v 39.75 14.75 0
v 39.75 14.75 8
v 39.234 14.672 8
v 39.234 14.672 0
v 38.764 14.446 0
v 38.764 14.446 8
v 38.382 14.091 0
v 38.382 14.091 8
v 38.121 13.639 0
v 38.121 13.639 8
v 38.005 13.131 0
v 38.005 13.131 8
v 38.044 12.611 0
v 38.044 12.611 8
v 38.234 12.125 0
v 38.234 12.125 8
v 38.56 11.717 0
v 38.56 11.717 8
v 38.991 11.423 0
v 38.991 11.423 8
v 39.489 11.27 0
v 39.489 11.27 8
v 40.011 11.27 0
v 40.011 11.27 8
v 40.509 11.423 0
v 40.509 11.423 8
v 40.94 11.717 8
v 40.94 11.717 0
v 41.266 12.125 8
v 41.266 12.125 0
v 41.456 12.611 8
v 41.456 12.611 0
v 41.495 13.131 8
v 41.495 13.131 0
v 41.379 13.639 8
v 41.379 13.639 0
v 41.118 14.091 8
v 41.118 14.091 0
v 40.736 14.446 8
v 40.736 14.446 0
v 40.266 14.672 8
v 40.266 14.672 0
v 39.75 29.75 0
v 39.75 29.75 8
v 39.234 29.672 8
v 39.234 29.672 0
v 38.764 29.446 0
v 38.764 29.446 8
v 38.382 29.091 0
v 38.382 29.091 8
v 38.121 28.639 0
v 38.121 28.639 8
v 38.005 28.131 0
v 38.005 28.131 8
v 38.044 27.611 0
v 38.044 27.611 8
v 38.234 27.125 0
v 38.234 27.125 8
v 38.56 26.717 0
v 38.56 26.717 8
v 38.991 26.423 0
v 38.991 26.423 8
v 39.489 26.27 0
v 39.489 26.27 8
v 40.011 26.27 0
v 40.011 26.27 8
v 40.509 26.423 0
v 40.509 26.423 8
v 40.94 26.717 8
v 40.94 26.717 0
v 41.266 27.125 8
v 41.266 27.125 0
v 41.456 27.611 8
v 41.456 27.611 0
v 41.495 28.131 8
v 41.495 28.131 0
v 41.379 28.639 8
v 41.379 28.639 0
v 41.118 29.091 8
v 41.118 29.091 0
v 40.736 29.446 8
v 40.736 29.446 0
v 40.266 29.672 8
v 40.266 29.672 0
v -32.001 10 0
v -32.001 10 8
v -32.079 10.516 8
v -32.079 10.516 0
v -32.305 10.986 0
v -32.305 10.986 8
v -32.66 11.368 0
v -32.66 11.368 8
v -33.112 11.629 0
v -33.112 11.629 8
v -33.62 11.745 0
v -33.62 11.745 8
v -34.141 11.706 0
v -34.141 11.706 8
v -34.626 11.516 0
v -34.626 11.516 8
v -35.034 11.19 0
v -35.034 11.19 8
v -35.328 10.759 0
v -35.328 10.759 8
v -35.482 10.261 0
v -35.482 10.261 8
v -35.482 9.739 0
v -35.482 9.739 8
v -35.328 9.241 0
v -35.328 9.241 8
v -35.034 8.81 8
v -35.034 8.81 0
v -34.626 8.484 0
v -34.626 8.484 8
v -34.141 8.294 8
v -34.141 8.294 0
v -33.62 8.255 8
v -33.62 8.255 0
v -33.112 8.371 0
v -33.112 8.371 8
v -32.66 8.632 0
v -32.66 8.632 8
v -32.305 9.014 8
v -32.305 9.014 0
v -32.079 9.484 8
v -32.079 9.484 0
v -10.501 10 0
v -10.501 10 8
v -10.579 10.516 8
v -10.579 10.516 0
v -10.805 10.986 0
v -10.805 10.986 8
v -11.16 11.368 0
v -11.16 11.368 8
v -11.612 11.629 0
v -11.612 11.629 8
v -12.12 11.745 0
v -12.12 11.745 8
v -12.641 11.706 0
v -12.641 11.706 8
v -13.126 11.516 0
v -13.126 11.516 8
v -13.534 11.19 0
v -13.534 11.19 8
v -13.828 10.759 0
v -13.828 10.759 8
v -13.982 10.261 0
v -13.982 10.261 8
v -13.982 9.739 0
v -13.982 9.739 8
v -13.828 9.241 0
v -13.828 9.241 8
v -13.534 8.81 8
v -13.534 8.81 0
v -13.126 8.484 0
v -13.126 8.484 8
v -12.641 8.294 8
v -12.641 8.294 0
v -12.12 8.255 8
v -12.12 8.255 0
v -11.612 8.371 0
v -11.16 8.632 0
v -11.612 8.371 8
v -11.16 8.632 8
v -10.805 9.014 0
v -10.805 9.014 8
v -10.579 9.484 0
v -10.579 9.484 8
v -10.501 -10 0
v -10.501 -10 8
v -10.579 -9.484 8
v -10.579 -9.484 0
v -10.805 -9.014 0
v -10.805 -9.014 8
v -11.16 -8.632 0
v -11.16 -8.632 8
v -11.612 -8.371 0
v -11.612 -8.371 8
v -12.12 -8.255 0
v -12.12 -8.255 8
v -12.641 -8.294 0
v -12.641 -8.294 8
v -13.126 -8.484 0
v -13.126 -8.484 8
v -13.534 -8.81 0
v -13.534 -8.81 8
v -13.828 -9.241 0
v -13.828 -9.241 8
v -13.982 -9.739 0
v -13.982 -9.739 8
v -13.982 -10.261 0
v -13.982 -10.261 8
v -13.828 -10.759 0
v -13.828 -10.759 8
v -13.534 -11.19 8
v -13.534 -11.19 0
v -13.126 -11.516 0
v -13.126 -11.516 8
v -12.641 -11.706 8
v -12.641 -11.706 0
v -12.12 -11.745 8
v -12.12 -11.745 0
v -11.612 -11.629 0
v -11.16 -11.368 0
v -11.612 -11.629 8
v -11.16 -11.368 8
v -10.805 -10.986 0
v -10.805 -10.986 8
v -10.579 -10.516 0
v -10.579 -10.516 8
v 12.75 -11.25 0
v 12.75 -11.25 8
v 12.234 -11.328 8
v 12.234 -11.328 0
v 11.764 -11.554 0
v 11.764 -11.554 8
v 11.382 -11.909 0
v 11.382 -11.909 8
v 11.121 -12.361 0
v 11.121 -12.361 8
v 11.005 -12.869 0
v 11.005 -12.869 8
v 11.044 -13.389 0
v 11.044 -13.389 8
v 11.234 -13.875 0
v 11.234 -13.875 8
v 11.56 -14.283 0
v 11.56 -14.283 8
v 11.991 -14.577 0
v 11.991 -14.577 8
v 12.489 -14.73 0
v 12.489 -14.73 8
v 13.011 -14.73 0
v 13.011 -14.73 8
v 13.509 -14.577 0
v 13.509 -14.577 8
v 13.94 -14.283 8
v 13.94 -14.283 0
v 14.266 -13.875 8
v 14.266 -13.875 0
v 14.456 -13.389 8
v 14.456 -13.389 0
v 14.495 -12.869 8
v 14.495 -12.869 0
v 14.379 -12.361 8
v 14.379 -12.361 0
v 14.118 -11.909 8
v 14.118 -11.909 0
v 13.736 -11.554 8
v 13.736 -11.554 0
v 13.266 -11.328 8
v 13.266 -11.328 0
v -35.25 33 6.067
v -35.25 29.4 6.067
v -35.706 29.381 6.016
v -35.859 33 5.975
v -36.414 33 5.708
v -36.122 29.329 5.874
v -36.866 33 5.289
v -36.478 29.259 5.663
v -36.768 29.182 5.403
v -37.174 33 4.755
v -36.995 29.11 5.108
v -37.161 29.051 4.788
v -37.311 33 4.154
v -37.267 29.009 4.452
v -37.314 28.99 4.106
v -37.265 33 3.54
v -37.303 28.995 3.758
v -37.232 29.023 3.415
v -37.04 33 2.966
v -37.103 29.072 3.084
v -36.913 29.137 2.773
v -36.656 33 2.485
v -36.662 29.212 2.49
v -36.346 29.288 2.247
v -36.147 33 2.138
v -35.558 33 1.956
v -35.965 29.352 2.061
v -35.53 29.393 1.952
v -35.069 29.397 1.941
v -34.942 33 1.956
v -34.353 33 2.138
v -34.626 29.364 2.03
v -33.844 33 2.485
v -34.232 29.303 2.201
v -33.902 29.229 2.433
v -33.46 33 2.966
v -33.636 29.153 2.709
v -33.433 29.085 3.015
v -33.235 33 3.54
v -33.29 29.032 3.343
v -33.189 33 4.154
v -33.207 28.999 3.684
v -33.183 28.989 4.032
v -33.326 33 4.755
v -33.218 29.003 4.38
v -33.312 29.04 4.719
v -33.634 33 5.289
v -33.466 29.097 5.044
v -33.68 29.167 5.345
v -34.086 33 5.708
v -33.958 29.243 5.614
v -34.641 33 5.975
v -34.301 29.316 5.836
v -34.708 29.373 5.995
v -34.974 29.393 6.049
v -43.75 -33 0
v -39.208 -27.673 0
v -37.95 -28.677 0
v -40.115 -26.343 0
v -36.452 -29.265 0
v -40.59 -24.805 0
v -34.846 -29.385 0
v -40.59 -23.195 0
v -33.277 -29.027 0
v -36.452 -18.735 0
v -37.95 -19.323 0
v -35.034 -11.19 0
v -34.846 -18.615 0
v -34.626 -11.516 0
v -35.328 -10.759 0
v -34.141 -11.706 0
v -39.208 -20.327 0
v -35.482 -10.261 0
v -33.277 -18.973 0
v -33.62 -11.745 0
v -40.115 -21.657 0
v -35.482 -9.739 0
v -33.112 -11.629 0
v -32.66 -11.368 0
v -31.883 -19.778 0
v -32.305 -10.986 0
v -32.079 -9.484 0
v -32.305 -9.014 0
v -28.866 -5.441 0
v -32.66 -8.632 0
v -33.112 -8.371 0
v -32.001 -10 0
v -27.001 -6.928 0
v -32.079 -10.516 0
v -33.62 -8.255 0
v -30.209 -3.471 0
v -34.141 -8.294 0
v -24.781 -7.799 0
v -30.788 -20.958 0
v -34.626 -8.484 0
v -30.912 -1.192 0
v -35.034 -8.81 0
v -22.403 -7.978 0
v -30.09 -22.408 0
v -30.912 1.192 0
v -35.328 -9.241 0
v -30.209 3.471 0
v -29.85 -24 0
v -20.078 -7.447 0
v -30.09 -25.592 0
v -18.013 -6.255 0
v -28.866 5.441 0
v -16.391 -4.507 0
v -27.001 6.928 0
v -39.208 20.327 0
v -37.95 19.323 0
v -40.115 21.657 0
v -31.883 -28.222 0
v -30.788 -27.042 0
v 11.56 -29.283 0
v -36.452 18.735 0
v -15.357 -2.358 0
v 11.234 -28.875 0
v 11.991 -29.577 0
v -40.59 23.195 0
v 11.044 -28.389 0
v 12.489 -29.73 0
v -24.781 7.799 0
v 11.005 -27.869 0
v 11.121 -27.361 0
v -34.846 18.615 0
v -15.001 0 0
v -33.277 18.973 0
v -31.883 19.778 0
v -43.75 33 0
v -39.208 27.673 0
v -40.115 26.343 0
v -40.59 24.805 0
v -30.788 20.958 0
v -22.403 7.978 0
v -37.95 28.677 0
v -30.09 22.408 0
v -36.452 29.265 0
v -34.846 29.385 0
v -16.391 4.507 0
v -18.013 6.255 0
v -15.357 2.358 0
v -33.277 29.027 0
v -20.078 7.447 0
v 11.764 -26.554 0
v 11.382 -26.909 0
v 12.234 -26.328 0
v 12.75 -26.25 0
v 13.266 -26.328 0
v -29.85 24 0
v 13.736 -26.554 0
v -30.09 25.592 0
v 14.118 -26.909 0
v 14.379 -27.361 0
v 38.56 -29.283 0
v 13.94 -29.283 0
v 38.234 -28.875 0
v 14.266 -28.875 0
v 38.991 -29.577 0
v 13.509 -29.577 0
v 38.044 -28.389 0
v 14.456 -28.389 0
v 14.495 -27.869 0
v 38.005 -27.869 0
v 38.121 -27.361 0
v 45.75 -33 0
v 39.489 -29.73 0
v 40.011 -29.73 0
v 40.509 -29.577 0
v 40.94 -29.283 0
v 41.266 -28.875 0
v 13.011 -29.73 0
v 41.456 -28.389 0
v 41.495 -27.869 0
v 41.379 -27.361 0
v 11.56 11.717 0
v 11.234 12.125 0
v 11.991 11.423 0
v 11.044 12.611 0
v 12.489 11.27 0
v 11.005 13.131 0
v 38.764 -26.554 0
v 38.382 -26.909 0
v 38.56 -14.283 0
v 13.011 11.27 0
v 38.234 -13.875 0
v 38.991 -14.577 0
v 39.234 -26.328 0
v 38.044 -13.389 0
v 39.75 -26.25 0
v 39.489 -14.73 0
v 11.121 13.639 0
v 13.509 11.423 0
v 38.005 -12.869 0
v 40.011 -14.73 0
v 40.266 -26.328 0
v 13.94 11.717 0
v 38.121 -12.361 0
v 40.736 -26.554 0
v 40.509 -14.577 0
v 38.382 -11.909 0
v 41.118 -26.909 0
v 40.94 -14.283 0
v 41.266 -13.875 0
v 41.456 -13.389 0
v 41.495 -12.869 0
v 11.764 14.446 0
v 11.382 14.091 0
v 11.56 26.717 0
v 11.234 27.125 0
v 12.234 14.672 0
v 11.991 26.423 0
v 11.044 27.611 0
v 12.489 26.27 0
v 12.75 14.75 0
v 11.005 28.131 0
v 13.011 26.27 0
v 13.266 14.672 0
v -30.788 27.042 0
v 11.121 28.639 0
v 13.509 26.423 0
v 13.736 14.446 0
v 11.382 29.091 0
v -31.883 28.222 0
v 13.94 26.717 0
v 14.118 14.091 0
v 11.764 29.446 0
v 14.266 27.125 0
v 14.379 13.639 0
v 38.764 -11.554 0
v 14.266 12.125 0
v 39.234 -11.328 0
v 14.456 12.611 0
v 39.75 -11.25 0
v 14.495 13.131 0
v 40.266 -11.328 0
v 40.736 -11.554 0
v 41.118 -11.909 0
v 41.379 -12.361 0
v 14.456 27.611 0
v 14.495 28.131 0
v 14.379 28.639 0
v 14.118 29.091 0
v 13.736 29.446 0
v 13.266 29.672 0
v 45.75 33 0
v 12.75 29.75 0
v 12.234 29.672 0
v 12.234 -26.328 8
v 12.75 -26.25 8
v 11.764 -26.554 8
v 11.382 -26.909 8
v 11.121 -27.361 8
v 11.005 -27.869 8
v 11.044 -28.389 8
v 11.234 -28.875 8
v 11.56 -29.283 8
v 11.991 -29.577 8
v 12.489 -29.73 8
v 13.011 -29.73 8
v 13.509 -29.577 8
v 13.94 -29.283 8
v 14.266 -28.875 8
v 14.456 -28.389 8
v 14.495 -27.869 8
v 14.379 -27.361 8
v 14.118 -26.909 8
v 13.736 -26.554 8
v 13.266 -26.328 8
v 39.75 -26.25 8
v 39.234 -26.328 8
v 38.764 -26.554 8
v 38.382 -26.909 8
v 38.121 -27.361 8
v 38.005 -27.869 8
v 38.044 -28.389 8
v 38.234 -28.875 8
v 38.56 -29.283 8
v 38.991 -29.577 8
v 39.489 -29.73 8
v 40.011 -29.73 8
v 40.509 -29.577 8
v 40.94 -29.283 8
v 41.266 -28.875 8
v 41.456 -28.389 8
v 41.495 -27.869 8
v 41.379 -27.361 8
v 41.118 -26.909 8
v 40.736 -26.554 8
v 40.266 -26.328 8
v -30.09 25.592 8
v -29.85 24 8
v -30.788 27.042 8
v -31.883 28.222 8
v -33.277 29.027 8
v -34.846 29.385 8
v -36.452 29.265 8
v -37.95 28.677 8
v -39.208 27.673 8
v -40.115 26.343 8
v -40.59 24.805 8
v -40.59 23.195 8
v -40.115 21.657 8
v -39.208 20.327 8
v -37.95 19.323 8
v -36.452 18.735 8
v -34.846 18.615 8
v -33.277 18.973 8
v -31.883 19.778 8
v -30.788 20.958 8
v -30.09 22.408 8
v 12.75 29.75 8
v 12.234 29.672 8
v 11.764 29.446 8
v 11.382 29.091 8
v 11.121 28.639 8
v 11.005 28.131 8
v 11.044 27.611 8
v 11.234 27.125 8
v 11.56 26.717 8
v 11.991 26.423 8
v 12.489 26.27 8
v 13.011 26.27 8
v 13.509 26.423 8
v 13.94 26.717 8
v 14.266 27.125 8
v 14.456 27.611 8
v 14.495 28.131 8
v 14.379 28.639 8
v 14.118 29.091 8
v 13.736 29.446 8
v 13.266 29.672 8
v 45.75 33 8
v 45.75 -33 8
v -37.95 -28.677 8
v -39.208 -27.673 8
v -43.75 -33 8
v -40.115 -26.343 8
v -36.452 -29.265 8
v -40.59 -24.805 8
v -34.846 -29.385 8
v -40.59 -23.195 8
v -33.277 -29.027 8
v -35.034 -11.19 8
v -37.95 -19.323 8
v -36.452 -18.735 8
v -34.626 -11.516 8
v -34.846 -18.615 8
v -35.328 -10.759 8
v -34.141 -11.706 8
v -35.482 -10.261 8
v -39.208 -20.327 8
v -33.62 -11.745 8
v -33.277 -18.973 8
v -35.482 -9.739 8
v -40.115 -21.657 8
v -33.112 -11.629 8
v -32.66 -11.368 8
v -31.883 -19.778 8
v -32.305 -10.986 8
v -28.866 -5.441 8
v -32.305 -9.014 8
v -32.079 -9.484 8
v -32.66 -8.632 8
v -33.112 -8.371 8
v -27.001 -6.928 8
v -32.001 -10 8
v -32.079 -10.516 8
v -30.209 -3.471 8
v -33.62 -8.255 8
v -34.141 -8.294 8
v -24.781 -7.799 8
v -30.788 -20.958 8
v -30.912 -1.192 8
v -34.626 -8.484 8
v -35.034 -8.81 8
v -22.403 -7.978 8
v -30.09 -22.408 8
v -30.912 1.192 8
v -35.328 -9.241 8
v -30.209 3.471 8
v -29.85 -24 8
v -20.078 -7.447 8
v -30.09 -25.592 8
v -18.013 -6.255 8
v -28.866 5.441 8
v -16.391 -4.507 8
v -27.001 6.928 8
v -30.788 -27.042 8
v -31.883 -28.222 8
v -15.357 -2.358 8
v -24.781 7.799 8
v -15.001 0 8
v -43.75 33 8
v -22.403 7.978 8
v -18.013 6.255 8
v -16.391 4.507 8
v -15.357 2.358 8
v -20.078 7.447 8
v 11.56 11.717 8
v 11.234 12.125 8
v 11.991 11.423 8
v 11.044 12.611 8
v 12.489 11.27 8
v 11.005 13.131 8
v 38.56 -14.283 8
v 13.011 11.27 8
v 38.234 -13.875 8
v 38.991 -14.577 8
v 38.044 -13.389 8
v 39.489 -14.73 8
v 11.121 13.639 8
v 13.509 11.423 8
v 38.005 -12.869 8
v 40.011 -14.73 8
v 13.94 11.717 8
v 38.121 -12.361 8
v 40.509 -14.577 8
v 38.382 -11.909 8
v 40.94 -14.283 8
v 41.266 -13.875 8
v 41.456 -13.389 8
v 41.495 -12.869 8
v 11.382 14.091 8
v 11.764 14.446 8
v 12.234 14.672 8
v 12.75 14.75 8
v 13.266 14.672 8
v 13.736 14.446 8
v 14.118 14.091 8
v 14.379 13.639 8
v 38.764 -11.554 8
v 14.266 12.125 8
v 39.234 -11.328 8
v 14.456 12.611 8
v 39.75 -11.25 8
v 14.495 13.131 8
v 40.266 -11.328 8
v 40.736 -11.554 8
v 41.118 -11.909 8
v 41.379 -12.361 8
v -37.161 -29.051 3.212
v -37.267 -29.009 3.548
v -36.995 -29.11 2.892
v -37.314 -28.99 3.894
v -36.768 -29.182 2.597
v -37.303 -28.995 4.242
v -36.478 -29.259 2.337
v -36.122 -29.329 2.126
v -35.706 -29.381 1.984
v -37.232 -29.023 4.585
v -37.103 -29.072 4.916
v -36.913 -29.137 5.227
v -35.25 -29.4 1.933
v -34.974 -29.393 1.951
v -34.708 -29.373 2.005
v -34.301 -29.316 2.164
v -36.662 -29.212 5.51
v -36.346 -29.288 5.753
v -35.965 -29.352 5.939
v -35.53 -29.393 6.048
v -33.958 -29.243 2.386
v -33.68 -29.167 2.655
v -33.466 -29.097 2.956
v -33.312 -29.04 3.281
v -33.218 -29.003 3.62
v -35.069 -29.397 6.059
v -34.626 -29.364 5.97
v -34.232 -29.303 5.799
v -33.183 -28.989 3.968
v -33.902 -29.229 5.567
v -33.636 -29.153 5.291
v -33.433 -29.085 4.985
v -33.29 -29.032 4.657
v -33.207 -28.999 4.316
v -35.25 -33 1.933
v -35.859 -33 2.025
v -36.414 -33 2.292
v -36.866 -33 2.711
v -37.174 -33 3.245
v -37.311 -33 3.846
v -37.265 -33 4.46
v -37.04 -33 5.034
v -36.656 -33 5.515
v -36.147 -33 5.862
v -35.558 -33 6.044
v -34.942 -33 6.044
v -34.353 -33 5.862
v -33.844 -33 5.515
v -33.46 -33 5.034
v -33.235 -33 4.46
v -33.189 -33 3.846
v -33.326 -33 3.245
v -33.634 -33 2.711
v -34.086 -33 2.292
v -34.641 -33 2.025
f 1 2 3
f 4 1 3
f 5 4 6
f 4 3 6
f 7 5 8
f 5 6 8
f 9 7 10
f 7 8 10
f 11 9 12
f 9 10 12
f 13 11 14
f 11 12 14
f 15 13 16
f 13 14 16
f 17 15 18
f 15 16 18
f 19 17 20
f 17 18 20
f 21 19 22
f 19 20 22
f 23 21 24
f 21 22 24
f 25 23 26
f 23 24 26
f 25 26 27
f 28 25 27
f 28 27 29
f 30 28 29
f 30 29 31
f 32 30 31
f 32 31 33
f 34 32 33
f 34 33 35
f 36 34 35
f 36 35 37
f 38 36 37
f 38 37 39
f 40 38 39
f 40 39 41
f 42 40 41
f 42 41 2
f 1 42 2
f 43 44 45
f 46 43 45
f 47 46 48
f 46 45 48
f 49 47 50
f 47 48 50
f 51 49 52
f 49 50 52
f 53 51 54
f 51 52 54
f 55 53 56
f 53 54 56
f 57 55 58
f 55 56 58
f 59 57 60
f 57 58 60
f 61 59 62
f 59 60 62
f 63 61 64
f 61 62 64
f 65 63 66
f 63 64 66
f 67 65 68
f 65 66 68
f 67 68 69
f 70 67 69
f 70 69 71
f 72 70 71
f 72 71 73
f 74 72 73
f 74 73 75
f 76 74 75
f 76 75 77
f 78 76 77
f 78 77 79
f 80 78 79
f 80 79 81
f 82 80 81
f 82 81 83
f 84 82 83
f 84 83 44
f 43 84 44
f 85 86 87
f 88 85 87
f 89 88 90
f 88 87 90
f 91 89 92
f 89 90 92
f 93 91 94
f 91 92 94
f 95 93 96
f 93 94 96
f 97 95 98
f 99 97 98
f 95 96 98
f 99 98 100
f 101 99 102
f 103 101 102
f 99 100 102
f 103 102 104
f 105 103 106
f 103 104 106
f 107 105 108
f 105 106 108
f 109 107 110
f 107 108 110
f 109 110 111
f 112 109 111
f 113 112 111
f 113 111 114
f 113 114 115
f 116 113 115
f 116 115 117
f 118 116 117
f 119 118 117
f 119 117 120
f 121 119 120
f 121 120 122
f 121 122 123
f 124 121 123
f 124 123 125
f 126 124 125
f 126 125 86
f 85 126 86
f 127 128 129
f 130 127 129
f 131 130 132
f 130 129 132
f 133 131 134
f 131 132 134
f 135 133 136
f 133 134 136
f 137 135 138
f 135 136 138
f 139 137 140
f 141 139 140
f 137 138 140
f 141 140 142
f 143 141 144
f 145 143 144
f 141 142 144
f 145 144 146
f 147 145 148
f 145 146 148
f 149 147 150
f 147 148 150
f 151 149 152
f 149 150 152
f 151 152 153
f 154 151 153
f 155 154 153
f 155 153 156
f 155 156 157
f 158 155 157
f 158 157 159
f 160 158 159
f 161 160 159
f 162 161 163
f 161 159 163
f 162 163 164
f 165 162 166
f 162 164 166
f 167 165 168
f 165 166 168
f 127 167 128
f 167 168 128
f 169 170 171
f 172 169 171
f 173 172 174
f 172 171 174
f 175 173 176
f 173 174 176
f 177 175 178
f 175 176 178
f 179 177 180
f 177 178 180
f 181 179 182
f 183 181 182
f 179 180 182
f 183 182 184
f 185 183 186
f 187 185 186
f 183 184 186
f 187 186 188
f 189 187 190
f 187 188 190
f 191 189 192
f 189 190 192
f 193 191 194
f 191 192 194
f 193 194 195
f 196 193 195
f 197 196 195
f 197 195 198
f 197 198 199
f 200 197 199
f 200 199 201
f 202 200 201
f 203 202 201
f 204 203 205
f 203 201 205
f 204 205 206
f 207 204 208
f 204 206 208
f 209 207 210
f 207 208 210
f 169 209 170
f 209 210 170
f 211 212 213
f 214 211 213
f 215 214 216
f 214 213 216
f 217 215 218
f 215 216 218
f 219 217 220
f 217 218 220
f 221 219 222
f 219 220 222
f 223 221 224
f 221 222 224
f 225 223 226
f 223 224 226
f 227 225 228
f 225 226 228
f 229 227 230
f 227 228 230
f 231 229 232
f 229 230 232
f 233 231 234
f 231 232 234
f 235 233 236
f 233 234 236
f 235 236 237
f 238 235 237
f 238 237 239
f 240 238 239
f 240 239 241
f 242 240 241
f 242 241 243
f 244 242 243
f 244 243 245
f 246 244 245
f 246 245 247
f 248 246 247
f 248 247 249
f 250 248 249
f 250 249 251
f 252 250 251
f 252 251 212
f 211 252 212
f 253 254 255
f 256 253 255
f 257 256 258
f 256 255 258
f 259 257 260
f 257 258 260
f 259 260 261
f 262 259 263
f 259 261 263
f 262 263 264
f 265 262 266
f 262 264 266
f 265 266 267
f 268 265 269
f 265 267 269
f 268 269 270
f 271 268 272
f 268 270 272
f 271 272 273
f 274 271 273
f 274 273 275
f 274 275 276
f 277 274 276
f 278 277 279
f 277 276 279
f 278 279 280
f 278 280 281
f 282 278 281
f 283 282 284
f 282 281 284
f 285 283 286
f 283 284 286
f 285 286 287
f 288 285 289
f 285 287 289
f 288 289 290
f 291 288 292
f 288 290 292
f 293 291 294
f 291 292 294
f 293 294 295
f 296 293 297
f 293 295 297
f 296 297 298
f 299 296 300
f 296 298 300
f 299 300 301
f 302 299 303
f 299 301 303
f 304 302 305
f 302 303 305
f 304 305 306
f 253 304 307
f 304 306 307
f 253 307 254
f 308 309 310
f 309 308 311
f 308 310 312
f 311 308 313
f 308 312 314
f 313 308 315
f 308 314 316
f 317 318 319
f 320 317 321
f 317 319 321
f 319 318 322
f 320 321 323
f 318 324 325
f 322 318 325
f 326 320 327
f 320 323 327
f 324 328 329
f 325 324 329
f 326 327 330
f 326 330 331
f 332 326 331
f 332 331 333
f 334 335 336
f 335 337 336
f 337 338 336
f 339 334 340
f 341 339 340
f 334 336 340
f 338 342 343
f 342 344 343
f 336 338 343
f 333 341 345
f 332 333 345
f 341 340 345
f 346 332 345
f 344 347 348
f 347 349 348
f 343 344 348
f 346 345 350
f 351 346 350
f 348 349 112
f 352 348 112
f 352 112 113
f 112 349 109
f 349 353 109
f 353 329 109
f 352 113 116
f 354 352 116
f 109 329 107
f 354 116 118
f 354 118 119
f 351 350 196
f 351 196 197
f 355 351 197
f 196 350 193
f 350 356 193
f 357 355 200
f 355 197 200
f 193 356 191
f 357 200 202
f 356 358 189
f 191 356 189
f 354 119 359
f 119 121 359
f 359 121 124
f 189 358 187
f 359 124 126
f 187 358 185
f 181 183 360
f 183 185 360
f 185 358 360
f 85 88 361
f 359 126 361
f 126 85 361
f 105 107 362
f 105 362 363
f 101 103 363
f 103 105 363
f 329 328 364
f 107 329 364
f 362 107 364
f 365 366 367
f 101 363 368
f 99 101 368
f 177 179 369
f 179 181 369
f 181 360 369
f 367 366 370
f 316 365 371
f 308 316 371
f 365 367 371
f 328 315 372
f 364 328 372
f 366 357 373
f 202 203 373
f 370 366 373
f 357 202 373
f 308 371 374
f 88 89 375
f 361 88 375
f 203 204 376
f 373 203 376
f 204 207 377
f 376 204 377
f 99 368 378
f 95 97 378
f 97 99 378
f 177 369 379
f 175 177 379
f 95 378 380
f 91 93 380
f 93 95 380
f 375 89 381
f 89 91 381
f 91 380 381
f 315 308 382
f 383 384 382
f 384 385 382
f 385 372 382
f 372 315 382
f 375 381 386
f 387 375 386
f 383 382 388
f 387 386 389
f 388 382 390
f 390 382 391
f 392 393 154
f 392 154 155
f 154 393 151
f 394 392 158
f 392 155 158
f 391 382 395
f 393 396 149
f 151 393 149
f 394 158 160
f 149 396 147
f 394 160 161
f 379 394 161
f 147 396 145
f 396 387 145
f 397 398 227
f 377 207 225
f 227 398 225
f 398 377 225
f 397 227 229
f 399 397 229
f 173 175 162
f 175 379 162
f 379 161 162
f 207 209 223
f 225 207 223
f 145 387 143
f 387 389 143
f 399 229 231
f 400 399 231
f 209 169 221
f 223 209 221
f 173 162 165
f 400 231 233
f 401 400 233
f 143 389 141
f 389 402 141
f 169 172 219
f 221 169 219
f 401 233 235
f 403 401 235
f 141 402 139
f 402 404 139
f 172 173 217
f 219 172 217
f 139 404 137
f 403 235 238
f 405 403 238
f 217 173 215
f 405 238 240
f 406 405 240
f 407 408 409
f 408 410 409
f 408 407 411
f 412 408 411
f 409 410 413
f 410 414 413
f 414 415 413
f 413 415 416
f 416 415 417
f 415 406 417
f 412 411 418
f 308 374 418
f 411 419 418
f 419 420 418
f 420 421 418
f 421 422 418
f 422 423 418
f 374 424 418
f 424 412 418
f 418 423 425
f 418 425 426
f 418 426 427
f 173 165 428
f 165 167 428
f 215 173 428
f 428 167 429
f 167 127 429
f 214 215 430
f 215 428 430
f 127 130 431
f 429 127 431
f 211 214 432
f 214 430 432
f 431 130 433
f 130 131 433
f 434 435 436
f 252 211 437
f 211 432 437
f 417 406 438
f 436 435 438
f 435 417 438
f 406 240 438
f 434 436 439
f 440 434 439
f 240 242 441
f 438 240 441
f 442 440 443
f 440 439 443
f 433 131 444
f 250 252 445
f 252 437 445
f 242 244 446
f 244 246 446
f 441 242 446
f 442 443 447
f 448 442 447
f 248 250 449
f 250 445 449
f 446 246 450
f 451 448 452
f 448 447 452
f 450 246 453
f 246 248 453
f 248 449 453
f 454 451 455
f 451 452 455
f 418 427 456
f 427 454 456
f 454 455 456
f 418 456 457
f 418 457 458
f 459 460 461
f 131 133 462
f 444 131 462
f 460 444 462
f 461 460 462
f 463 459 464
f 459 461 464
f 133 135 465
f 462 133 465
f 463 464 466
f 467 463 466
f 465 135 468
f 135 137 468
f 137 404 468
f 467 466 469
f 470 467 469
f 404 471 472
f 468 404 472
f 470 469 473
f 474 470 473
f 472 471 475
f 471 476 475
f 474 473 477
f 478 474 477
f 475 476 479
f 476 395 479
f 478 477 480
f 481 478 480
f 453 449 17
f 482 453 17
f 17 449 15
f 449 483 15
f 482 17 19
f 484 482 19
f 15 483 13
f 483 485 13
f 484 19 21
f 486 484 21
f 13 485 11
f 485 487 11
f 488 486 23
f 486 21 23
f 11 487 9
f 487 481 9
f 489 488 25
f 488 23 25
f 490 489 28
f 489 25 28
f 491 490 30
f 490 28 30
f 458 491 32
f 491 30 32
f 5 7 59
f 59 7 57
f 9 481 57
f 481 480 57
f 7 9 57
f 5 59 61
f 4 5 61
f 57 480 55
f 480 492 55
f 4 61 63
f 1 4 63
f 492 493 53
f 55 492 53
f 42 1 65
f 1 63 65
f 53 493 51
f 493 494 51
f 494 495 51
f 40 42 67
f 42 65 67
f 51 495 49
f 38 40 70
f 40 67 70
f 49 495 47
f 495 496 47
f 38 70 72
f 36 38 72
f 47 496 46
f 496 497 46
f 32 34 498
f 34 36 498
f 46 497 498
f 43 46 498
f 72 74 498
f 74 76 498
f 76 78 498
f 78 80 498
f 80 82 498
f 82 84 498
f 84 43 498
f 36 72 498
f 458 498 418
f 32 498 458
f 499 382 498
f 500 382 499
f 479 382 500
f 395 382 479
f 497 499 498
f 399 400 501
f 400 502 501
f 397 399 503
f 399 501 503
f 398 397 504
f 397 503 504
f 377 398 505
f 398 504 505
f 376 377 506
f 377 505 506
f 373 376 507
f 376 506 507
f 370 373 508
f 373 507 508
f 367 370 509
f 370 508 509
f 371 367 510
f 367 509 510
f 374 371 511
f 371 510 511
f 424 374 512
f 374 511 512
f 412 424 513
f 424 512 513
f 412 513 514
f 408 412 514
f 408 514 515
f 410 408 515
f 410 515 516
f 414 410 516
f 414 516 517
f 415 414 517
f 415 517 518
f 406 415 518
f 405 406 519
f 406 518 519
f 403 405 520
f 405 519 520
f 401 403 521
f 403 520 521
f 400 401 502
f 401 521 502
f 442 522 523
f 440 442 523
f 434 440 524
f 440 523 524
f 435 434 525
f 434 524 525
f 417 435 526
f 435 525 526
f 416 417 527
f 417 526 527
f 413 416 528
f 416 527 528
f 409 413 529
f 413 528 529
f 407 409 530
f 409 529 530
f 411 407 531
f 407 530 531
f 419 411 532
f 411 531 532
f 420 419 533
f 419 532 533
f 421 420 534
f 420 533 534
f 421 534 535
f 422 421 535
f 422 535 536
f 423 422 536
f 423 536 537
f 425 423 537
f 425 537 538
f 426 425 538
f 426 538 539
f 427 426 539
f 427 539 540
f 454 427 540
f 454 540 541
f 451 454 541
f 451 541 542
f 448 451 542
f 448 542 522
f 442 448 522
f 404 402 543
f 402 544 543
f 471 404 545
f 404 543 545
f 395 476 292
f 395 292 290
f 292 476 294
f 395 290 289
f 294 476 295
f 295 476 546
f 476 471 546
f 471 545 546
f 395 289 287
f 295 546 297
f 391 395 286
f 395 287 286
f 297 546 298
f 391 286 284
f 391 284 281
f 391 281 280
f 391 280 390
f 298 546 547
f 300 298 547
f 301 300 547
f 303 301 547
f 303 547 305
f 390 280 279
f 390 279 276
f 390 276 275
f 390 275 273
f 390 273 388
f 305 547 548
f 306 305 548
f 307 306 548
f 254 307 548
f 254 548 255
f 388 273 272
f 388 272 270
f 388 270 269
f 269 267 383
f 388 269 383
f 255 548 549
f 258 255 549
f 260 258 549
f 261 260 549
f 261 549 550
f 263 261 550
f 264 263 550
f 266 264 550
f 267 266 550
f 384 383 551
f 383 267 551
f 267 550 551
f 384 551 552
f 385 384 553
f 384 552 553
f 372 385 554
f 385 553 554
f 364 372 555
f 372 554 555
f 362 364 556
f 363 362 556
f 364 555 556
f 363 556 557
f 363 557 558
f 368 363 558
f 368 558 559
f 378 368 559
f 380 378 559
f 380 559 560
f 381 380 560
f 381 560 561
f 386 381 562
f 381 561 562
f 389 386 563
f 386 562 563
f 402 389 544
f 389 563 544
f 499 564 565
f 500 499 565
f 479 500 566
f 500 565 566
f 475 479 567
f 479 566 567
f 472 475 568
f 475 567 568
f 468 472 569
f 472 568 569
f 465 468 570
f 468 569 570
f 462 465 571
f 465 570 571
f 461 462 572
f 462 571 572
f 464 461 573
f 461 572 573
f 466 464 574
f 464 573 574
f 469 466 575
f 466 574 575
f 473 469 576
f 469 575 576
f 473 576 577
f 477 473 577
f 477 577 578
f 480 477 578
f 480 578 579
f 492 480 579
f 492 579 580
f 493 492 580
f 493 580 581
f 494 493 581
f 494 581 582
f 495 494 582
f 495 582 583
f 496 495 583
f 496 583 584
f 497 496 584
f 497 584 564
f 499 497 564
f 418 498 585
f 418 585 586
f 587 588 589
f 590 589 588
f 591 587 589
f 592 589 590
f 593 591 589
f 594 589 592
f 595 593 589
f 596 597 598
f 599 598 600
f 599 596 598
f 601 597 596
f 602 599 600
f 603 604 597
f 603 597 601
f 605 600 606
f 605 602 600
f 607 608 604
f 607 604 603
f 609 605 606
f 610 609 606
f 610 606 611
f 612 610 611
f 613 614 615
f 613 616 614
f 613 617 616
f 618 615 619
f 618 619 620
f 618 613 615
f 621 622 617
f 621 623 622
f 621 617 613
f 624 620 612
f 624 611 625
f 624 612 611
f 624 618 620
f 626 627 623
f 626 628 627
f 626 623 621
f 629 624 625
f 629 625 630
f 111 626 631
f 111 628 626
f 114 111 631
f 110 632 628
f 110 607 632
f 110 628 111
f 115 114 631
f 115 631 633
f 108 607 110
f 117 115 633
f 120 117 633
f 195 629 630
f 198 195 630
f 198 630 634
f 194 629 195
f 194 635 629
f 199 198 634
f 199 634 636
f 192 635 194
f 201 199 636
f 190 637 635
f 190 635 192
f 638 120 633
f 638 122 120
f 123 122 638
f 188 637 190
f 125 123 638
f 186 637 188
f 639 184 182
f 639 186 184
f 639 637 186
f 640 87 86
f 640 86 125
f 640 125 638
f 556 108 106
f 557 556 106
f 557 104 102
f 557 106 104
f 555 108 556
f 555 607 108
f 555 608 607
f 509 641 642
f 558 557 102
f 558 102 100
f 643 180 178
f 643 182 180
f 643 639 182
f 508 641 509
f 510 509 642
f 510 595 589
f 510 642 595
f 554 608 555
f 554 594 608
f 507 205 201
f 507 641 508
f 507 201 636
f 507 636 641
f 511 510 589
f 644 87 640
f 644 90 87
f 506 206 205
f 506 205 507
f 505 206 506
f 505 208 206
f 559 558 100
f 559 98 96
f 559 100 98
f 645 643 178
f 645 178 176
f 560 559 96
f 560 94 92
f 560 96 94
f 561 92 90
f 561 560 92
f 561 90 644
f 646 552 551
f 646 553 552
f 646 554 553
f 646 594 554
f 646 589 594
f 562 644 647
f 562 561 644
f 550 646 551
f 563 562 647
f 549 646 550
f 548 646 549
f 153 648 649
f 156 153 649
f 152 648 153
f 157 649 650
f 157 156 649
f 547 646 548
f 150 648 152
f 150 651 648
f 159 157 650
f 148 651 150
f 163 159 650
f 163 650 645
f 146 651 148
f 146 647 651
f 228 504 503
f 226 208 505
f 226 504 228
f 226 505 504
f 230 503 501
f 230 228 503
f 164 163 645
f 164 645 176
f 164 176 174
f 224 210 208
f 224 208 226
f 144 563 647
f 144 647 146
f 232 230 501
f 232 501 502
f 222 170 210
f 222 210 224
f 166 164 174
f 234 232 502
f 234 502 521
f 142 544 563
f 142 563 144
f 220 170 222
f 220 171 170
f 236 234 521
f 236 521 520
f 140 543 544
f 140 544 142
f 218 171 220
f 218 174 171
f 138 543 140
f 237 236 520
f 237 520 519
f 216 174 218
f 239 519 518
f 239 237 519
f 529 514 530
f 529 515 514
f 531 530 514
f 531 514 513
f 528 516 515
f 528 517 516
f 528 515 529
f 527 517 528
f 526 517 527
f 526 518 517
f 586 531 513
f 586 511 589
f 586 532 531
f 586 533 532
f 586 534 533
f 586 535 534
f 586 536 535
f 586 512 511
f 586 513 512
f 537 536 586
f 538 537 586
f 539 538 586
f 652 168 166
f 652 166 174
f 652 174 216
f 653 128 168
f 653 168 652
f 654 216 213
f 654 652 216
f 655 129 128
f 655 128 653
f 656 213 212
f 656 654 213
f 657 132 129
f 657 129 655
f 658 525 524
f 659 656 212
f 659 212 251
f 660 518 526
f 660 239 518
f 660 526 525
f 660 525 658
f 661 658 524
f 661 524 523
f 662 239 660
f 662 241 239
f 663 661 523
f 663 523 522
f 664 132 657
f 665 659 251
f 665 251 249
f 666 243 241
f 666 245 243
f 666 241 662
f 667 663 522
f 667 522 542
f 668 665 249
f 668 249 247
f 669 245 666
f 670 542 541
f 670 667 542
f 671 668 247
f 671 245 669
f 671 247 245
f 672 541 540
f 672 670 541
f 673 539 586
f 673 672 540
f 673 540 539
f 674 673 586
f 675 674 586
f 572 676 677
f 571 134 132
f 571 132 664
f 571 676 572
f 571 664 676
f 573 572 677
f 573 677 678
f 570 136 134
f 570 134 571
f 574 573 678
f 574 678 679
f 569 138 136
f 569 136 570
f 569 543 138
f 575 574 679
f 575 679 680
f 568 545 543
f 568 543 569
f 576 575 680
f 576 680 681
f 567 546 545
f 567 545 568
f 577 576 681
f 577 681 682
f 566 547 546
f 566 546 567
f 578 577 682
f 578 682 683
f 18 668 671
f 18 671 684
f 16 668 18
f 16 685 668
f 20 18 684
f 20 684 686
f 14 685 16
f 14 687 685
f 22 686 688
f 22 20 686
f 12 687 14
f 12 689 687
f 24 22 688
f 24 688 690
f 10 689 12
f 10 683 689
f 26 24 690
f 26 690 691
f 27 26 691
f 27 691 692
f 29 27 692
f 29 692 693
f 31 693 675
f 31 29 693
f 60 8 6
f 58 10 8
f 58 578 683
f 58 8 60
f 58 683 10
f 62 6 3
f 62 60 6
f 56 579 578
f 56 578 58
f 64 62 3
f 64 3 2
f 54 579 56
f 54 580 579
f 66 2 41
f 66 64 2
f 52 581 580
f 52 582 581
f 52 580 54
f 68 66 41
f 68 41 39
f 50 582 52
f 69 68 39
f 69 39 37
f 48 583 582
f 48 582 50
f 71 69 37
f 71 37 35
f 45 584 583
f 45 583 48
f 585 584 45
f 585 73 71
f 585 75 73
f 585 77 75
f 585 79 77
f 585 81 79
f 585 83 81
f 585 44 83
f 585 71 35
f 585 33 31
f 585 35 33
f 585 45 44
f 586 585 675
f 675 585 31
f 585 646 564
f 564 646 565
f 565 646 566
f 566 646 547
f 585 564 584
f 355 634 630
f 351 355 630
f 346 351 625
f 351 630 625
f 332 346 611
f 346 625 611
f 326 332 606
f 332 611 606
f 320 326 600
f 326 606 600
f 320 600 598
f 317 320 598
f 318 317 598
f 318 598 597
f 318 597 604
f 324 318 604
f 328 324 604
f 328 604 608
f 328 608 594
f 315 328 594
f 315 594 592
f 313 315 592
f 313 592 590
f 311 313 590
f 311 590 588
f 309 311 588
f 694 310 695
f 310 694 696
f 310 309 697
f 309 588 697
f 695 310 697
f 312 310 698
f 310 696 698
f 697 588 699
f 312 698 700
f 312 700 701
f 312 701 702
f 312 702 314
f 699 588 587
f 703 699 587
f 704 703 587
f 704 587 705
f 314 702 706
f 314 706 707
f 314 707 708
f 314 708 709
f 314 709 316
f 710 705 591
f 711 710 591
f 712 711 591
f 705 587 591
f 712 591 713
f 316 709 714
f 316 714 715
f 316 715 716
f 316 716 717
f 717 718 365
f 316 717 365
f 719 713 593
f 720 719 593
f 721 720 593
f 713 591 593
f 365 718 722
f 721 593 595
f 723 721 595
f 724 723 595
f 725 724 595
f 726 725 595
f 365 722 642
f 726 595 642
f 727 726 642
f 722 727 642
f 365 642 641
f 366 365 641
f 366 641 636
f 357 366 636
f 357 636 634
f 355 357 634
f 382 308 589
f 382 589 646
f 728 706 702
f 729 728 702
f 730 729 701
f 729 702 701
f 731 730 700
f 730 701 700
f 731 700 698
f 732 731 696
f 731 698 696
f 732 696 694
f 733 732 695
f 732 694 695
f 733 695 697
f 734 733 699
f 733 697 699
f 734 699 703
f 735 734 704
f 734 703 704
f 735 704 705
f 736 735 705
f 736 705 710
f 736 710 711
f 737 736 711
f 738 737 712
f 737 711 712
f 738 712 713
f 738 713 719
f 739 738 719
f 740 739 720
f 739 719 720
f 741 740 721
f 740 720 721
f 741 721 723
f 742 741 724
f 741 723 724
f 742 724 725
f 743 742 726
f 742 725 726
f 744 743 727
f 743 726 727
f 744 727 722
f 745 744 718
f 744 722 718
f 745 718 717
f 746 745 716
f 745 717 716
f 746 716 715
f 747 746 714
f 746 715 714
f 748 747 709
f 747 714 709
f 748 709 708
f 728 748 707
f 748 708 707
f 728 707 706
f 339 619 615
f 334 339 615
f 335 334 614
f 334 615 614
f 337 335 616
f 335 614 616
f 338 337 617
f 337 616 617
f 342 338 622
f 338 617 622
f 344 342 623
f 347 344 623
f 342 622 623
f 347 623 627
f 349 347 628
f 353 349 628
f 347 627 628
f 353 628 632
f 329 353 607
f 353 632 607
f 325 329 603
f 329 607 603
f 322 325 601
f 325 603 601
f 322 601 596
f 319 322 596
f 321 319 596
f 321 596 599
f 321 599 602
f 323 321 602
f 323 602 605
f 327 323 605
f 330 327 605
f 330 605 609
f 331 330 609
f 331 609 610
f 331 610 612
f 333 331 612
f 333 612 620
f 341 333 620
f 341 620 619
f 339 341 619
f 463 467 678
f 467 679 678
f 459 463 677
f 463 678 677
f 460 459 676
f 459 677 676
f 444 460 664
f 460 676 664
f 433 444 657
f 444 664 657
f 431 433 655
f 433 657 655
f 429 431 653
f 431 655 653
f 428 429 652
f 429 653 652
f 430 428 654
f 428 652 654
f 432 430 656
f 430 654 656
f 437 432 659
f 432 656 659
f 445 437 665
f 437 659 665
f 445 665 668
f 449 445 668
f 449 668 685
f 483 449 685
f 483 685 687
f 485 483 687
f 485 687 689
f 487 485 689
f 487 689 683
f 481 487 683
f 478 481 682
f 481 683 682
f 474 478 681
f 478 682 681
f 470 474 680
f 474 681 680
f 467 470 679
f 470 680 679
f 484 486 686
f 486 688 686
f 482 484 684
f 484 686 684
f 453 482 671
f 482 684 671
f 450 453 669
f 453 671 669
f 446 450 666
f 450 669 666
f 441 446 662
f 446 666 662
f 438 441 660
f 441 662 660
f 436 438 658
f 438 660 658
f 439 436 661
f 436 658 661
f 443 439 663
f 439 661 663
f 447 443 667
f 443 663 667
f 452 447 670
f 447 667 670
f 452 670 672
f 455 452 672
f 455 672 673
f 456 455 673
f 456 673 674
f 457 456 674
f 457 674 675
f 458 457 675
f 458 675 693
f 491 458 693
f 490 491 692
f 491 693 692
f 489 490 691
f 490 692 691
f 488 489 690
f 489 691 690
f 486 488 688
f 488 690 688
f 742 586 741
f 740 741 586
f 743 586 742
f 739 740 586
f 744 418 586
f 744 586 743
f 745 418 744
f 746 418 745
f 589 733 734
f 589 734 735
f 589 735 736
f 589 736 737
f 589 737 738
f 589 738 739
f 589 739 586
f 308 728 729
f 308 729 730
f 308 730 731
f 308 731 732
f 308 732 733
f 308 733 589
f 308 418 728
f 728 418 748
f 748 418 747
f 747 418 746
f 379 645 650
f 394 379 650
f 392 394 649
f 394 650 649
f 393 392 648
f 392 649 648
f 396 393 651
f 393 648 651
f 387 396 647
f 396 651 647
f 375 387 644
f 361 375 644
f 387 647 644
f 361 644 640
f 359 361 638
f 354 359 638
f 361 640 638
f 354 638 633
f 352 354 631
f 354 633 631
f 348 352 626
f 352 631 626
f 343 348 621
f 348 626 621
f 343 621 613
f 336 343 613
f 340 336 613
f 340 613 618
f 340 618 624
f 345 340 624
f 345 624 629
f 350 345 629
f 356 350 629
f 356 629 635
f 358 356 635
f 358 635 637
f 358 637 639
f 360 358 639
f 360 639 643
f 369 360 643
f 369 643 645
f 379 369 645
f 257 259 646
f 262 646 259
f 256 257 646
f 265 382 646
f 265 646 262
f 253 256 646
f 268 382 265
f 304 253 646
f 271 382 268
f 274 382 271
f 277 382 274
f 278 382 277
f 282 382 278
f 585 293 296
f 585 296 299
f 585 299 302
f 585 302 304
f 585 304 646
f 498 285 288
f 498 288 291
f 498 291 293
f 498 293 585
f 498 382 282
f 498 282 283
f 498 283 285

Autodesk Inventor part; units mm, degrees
ref_plane "YZ Plane" through (0, 0, 0) normal (1, 0, 0) x (0, 1, 0)
ref_plane "XZ Plane" through (0, 0, 0) normal (0, 1, 0) x (-1, 0, 0)
ref_plane "XY Plane" through (0, 0, 0) normal (0, 0, 1) x (1, 0, 0)
sketch "Sketch1" plane through (0, 0, 0) normal (0, 0, 1) x (1, 0, 0)
  line L0 (-43.75, 33) -> (43.75, 33)
  line L1 (43.75, 33) -> (43.75, -33)
  line L2 (43.75, -33) -> (-43.75, -33)
  line L3 (-43.75, -33) -> (-43.75, 33)
  point P0 (0, 0)
  point P1 (0, 33)
  point P2 (-43.75, 0)
  dimension "d0" = 87.5
  dimension "d1" = 66
extrude "Extrusion1" add sketch "Sketch1" along normal blind 8
sketch "Sketch4" plane through (0, 0, 8) normal (0, 0, 1) x (1, 0, 0)
  line L0 (43.75, 33) -> (-43.75, 33) projected
  line L1 (-43.75, 33) -> (-43.75, -33) projected
  circle A0 centre (-35.25, 24) radius 5.4
  circle A1 centre (-35.25, -24) radius 5.4
  line L2 (-43.75, -33) -> (43.75, -33) projected
  point P0 (0, 0)
  dimension "d27" = 8.5
  dimension "d28" = 9
  dimension "d29" = 10.8
  dimension "d30" = 9
extrude "Extrusion4" cut sketch "Sketch4" against normal through all
sketch "Sketch5" plane through (0, 0, 8) normal (0, 0, 1) x (1, 0, 0)
  circle A0 centre (-23.0012, 0) radius 4
  circle A1 centre (-23.0012, 0) radius 8
  line L0 (-43.75, 33) -> (-43.75, -33) projected
  line L1 (43.75, 33) -> (-43.75, 33) projected
  circle A2 centre (-23.0012, 0) radius 7 projected
  point P0 (0, 0)
  point P1 (-43.75, 0)
  dimension "d24" = 16
  dimension "d33" = 20.7488
extrude "Extrusion5" cut sketch "Sketch5" against normal through all contours A0 | A1 | A2
sketch "Sketch6" plane through (0, 0, 8) normal (0, 0, 1) x (1, 0, 0)
  circle A0 centre (-33.7512, 10) radius 1.75
  circle A1 centre (-12.2512, 10) radius 1.75
  circle A2 centre (-12.2512, -10) radius 1.75
  circle A3 centre (-33.7512, -10) radius 1.75
  line L0 (-33.7512, 10) -> (-12.2512, 10)
  line L1 (-12.2512, 10) -> (-12.2512, -10)
  line L2 (-12.2512, -10) -> (-33.7512, -10)
  line L3 (-33.7512, -10) -> (-33.7512, 10)
  line L4 (-33.7512, 10) -> (-12.2512, -10) construction
  line L5 (-12.2512, 10) -> (-33.7512, -10) construction
  circle A4 centre (-23.0012, 0) radius 8 projected
  line L6 (-43.75, 33) -> (-43.75, -33) projected
  point P0 (0, 0)
  point P1 (-23.0012, 0)
  dimension "d35" = 3.5
  dimension "d36" = 21.5
  dimension "d37" = 20
extrude "Extrusion6" cut sketch "Sketch6" against normal through all contours L0 L3 A0 | A0 L3 L0 | L0 L1 A1 | A1 L1 L0 | L3 L2 A3 | A3 L2 L3 | L1 L2 A2 | A2 L2 L1
sketch "Sketch7" plane through (0, 0, 8) normal (0, 0, 1) x (1, 0, 0)
  point P0 (0, 0)
sketch "Sketch8" plane through (0, 0, 0) normal (0, 0, -1) x (-1, 0, 0)
  line L0 (-35.75, -33) -> (-43.75, -33)
  line L1 (-43.75, -33) -> (-43.75, 33)
  line L2 (-43.75, 33) -> (-35.75, 33)
  line L3 (-35.75, 33) -> (-35.75, -33)
  line L4 (-8.75, -33) -> (-16.75, -33)
  line L5 (-16.75, -33) -> (-16.75, 33)
  line L6 (-16.75, 33) -> (-8.75, 33)
  line L7 (-8.75, 33) -> (-8.75, -33)
  line L8 (-44.55, -20.5) -> (-44.55, -29.5) projected
  point P0 (0, 0)
  point P1 (-39.75, -28)
  point P2 (-39.75, -13)
  point P3 (-39.75, 13)
  point P4 (-39.75, 28)
  dimension "d38" = 4
  dimension "d39" = 5
  dimension "d40" = 15
  dimension "d41" = 5
  dimension "d42" = 15
  dimension "d56" = 26
hole "Hole1" at (39.75, 28, 0) direction (0, 0, 1) diameter 3.5 end through all
move faces "Move1" translate (2, 0, 0) faces at (43.75, -11, 2.6667)
pattern_linear "Rectangular Pattern2" count 2 spacing 15 along (0, -1, 0) count 2 spacing 41 along (0, -1, 0) of "Hole1"
pattern_linear "Rectangular Pattern3" count 2 spacing 27 along (-1, 0, 0) of "Hole1", "Rectangular Pattern2"
sketch "Sketch10" plane through (-43.75, 33, 8) normal (0, 1, 0) x (1, 0, 0)
  line L0 (0, 8) -> (0, 0) projected
  point P0 (43.75, 8)
  point P1 (8.5, 4)
  point P2 (0, 4)
  dimension "d66" = 8.5
hole "Hole2" at (-35.25, 33, 4) direction (0, -1, 0) diameter 4.134 depth 7.45 tip angle 118 thread size "M5x0.8" class "6H" standard "ISO Metric profile"
sketch "Sketch11" plane through (-43.75, -33, 0) normal (0, -1, 0) x (1, 0, 0)
  line L0 (0, 0) -> (0, 8) projected
  point P0 (43.75, 0)
  point P1 (8.5, 4)
  point P2 (0, 4)
  dimension "d74" = 8.5
hole "Hole3" at (-35.25, -33, 4) direction (0, 1, 0) diameter 4.134 depth 7.45 tip angle 118 thread size "M5x0.8" class "6H" standard "ISO Metric profile"
equation "\"d30\" = d28"
equation "\"d41\" = d39"
equation "\"d42\" = d40"
properties part number "0005-10-011" material "Wood (Maple)"
